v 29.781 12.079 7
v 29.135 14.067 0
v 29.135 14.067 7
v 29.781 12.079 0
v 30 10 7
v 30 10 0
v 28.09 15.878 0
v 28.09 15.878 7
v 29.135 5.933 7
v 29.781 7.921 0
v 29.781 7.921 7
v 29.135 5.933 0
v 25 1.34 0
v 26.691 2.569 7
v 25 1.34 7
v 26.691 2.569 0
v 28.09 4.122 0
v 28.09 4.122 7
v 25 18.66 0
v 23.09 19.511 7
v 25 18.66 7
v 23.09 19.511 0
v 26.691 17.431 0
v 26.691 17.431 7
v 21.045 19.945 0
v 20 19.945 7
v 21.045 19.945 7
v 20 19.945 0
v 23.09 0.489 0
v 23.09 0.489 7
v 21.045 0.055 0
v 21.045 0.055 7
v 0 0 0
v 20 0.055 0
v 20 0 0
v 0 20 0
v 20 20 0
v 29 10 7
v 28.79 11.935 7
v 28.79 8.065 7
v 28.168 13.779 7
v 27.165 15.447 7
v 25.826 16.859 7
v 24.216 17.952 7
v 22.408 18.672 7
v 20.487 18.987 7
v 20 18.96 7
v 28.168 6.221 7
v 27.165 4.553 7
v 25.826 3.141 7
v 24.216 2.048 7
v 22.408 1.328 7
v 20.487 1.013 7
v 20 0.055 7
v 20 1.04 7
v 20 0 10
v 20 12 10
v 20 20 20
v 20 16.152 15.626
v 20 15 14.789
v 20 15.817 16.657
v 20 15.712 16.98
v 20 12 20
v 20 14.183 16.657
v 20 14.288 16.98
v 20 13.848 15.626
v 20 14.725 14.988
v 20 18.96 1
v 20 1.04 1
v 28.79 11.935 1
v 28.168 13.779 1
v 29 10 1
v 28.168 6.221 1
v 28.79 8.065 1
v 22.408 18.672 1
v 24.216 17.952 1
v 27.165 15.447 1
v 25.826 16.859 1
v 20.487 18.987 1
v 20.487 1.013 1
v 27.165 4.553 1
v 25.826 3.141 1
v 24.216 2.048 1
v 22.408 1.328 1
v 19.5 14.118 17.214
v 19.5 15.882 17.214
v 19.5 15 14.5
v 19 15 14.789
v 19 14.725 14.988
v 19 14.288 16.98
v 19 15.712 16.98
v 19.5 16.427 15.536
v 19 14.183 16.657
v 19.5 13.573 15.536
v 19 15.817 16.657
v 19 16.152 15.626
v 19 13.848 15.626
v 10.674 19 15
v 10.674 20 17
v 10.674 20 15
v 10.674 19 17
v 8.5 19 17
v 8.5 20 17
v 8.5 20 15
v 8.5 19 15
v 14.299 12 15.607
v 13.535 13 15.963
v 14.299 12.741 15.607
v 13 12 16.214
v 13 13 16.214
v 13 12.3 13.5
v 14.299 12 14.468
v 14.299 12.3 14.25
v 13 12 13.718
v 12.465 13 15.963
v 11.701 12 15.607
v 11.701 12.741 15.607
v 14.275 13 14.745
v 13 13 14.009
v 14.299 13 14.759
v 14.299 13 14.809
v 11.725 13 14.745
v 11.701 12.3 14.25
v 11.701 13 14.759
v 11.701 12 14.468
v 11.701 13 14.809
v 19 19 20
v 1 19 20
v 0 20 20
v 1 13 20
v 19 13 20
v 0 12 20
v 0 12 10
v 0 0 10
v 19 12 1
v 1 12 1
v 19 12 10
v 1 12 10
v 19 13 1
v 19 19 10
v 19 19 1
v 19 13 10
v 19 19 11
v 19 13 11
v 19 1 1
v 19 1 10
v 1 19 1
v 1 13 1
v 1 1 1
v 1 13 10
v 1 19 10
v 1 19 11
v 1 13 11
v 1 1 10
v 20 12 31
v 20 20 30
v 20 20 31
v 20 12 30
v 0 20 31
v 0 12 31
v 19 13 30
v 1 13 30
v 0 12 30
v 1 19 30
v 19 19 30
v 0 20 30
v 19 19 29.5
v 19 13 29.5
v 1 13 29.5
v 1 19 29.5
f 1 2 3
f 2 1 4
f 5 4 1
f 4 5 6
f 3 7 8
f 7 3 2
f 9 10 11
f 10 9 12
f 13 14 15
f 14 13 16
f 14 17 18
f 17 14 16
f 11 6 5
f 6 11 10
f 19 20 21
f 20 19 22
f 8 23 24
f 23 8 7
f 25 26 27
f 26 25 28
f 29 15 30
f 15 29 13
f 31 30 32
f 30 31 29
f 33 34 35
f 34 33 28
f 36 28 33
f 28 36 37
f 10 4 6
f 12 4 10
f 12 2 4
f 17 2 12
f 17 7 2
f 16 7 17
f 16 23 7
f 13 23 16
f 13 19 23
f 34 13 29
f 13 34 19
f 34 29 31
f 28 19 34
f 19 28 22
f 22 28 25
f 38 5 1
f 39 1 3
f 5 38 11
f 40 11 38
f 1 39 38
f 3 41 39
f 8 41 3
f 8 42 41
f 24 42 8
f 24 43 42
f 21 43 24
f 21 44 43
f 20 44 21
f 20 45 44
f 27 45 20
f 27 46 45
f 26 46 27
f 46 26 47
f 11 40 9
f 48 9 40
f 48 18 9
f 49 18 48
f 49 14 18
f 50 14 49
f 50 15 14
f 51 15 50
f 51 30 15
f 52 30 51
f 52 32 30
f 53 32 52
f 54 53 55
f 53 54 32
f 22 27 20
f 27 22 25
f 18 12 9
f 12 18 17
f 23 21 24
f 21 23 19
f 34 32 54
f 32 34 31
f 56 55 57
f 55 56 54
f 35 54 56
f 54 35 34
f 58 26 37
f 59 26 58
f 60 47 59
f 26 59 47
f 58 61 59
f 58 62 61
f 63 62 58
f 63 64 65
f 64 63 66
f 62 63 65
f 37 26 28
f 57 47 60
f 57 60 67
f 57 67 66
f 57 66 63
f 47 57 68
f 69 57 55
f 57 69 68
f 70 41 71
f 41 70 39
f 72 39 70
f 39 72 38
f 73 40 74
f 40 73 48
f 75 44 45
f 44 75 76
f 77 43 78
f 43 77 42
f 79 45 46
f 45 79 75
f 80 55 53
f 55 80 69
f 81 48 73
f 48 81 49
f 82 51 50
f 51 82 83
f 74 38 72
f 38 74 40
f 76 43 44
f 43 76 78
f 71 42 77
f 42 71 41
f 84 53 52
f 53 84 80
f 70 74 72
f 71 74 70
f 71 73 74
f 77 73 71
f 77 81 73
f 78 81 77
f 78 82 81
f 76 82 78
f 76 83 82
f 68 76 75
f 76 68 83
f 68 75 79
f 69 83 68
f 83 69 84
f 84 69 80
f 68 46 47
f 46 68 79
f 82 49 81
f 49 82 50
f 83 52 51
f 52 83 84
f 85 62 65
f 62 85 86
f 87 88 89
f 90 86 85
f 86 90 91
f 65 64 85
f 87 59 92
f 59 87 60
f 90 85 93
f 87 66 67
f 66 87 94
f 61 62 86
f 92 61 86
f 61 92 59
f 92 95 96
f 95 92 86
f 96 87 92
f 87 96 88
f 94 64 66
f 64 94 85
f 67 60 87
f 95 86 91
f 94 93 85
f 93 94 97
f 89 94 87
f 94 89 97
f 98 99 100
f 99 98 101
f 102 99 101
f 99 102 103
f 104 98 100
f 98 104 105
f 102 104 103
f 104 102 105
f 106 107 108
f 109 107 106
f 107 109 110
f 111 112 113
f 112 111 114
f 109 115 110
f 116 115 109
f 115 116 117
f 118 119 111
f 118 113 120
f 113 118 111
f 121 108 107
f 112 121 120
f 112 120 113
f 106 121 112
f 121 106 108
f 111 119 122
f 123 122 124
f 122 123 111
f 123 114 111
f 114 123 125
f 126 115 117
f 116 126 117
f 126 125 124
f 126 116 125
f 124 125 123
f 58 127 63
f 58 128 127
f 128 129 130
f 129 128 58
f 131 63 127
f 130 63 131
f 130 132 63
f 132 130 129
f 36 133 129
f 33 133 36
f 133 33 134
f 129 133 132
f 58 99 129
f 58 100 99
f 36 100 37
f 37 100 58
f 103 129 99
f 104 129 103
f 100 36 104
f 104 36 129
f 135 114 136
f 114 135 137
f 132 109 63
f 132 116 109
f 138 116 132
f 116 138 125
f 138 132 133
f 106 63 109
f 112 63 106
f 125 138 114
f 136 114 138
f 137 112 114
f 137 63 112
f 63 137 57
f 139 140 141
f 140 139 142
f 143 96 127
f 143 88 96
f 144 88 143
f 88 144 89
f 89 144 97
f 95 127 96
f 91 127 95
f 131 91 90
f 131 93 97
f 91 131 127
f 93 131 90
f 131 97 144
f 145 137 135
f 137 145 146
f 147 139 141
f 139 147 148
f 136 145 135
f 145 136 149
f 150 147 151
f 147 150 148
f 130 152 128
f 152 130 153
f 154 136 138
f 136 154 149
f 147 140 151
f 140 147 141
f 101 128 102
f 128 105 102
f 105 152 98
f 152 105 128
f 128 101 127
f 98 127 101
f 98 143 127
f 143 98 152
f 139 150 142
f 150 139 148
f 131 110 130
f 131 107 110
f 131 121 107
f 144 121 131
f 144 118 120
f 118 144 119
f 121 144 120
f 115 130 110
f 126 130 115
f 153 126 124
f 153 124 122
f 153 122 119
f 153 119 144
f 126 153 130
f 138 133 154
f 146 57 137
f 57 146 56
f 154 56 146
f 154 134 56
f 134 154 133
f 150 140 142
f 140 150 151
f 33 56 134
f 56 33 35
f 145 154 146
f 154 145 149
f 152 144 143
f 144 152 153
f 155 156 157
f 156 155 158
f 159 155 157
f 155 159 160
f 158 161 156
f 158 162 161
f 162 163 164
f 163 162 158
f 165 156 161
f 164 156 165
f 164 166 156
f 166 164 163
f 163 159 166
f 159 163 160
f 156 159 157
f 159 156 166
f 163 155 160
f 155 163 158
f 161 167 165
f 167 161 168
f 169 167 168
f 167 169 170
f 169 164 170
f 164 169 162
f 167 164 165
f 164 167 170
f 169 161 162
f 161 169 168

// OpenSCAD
pot_width = 20;
pot_depth = 20;
pot_height = 10;

tank_width = 10;
tank_depth = 10;
tank_height = 10;

module pot(position, dimensions) {
    diff_position = [for (i = position) i + 1];
        
    diff_dimensions = [
        for (i = [0 : 2])
            if(i == 2) dimensions[i]
            else dimensions[i] - 2
    ];
    
    difference () {
        translate(position) {
            cube(dimensions);
        }
        
        translate(diff_position) {
            cube(diff_dimensions);
        }
    }
}

module tank(position, dimensions) {
    translate([20, 10, 0]) {
        difference () {
            cylinder(7, 10, 10);
            translate([-10, 0, 9]) {
                cube(20, center = true);
            };
            translate ([0, 0, 1]) {
                cylinder(11, 9, 9);
            }
        }
    } 
}

module esp_container() {
    pot([0, pot_depth - 8, 0], [20, 8, 20]);
}

module holes() {
    translate([19.5, 15, 16]) {
        rotate([0, 90, 0]) {
            sphere(1.5);
        }
    }
	
	translate([8.5, 18.5, 15]) {
		cube([2.174, 1.806, 2]);
	}
	
	translate([13, 12.3, 15]) {
        rotate([0, 90, 0]) {
            sphere(1.5);
        }
    }
}

module lid() {
    union() {
        color ("red", 1.0) {
            translate ([0, 12, 30]) {
                cube([20, 8, 1]);
            }
        }
    
        color ("blue", 1.0) {
            translate ([1, 13, 29.5]) {
                cube([18, 6, 1]);
            }
        }
    }
}

module esp_plane() {
    translate([0, 12, 10]) {
		cube([20, 7, 1]);
    }
}

union () {
    difference() {
        tank([pot_width - 0.9, 5, 0], [tank_width, tank_depth, tank_height]);
        holes();
    }
    
    difference() {
        esp_container();
        holes();
    }
    
    difference() {
        pot([0, 0, 0], [pot_width, pot_depth, pot_height]);
        holes();
    }
	
	difference() {
        esp_plane();
        holes();
    }
}

lid();

 
